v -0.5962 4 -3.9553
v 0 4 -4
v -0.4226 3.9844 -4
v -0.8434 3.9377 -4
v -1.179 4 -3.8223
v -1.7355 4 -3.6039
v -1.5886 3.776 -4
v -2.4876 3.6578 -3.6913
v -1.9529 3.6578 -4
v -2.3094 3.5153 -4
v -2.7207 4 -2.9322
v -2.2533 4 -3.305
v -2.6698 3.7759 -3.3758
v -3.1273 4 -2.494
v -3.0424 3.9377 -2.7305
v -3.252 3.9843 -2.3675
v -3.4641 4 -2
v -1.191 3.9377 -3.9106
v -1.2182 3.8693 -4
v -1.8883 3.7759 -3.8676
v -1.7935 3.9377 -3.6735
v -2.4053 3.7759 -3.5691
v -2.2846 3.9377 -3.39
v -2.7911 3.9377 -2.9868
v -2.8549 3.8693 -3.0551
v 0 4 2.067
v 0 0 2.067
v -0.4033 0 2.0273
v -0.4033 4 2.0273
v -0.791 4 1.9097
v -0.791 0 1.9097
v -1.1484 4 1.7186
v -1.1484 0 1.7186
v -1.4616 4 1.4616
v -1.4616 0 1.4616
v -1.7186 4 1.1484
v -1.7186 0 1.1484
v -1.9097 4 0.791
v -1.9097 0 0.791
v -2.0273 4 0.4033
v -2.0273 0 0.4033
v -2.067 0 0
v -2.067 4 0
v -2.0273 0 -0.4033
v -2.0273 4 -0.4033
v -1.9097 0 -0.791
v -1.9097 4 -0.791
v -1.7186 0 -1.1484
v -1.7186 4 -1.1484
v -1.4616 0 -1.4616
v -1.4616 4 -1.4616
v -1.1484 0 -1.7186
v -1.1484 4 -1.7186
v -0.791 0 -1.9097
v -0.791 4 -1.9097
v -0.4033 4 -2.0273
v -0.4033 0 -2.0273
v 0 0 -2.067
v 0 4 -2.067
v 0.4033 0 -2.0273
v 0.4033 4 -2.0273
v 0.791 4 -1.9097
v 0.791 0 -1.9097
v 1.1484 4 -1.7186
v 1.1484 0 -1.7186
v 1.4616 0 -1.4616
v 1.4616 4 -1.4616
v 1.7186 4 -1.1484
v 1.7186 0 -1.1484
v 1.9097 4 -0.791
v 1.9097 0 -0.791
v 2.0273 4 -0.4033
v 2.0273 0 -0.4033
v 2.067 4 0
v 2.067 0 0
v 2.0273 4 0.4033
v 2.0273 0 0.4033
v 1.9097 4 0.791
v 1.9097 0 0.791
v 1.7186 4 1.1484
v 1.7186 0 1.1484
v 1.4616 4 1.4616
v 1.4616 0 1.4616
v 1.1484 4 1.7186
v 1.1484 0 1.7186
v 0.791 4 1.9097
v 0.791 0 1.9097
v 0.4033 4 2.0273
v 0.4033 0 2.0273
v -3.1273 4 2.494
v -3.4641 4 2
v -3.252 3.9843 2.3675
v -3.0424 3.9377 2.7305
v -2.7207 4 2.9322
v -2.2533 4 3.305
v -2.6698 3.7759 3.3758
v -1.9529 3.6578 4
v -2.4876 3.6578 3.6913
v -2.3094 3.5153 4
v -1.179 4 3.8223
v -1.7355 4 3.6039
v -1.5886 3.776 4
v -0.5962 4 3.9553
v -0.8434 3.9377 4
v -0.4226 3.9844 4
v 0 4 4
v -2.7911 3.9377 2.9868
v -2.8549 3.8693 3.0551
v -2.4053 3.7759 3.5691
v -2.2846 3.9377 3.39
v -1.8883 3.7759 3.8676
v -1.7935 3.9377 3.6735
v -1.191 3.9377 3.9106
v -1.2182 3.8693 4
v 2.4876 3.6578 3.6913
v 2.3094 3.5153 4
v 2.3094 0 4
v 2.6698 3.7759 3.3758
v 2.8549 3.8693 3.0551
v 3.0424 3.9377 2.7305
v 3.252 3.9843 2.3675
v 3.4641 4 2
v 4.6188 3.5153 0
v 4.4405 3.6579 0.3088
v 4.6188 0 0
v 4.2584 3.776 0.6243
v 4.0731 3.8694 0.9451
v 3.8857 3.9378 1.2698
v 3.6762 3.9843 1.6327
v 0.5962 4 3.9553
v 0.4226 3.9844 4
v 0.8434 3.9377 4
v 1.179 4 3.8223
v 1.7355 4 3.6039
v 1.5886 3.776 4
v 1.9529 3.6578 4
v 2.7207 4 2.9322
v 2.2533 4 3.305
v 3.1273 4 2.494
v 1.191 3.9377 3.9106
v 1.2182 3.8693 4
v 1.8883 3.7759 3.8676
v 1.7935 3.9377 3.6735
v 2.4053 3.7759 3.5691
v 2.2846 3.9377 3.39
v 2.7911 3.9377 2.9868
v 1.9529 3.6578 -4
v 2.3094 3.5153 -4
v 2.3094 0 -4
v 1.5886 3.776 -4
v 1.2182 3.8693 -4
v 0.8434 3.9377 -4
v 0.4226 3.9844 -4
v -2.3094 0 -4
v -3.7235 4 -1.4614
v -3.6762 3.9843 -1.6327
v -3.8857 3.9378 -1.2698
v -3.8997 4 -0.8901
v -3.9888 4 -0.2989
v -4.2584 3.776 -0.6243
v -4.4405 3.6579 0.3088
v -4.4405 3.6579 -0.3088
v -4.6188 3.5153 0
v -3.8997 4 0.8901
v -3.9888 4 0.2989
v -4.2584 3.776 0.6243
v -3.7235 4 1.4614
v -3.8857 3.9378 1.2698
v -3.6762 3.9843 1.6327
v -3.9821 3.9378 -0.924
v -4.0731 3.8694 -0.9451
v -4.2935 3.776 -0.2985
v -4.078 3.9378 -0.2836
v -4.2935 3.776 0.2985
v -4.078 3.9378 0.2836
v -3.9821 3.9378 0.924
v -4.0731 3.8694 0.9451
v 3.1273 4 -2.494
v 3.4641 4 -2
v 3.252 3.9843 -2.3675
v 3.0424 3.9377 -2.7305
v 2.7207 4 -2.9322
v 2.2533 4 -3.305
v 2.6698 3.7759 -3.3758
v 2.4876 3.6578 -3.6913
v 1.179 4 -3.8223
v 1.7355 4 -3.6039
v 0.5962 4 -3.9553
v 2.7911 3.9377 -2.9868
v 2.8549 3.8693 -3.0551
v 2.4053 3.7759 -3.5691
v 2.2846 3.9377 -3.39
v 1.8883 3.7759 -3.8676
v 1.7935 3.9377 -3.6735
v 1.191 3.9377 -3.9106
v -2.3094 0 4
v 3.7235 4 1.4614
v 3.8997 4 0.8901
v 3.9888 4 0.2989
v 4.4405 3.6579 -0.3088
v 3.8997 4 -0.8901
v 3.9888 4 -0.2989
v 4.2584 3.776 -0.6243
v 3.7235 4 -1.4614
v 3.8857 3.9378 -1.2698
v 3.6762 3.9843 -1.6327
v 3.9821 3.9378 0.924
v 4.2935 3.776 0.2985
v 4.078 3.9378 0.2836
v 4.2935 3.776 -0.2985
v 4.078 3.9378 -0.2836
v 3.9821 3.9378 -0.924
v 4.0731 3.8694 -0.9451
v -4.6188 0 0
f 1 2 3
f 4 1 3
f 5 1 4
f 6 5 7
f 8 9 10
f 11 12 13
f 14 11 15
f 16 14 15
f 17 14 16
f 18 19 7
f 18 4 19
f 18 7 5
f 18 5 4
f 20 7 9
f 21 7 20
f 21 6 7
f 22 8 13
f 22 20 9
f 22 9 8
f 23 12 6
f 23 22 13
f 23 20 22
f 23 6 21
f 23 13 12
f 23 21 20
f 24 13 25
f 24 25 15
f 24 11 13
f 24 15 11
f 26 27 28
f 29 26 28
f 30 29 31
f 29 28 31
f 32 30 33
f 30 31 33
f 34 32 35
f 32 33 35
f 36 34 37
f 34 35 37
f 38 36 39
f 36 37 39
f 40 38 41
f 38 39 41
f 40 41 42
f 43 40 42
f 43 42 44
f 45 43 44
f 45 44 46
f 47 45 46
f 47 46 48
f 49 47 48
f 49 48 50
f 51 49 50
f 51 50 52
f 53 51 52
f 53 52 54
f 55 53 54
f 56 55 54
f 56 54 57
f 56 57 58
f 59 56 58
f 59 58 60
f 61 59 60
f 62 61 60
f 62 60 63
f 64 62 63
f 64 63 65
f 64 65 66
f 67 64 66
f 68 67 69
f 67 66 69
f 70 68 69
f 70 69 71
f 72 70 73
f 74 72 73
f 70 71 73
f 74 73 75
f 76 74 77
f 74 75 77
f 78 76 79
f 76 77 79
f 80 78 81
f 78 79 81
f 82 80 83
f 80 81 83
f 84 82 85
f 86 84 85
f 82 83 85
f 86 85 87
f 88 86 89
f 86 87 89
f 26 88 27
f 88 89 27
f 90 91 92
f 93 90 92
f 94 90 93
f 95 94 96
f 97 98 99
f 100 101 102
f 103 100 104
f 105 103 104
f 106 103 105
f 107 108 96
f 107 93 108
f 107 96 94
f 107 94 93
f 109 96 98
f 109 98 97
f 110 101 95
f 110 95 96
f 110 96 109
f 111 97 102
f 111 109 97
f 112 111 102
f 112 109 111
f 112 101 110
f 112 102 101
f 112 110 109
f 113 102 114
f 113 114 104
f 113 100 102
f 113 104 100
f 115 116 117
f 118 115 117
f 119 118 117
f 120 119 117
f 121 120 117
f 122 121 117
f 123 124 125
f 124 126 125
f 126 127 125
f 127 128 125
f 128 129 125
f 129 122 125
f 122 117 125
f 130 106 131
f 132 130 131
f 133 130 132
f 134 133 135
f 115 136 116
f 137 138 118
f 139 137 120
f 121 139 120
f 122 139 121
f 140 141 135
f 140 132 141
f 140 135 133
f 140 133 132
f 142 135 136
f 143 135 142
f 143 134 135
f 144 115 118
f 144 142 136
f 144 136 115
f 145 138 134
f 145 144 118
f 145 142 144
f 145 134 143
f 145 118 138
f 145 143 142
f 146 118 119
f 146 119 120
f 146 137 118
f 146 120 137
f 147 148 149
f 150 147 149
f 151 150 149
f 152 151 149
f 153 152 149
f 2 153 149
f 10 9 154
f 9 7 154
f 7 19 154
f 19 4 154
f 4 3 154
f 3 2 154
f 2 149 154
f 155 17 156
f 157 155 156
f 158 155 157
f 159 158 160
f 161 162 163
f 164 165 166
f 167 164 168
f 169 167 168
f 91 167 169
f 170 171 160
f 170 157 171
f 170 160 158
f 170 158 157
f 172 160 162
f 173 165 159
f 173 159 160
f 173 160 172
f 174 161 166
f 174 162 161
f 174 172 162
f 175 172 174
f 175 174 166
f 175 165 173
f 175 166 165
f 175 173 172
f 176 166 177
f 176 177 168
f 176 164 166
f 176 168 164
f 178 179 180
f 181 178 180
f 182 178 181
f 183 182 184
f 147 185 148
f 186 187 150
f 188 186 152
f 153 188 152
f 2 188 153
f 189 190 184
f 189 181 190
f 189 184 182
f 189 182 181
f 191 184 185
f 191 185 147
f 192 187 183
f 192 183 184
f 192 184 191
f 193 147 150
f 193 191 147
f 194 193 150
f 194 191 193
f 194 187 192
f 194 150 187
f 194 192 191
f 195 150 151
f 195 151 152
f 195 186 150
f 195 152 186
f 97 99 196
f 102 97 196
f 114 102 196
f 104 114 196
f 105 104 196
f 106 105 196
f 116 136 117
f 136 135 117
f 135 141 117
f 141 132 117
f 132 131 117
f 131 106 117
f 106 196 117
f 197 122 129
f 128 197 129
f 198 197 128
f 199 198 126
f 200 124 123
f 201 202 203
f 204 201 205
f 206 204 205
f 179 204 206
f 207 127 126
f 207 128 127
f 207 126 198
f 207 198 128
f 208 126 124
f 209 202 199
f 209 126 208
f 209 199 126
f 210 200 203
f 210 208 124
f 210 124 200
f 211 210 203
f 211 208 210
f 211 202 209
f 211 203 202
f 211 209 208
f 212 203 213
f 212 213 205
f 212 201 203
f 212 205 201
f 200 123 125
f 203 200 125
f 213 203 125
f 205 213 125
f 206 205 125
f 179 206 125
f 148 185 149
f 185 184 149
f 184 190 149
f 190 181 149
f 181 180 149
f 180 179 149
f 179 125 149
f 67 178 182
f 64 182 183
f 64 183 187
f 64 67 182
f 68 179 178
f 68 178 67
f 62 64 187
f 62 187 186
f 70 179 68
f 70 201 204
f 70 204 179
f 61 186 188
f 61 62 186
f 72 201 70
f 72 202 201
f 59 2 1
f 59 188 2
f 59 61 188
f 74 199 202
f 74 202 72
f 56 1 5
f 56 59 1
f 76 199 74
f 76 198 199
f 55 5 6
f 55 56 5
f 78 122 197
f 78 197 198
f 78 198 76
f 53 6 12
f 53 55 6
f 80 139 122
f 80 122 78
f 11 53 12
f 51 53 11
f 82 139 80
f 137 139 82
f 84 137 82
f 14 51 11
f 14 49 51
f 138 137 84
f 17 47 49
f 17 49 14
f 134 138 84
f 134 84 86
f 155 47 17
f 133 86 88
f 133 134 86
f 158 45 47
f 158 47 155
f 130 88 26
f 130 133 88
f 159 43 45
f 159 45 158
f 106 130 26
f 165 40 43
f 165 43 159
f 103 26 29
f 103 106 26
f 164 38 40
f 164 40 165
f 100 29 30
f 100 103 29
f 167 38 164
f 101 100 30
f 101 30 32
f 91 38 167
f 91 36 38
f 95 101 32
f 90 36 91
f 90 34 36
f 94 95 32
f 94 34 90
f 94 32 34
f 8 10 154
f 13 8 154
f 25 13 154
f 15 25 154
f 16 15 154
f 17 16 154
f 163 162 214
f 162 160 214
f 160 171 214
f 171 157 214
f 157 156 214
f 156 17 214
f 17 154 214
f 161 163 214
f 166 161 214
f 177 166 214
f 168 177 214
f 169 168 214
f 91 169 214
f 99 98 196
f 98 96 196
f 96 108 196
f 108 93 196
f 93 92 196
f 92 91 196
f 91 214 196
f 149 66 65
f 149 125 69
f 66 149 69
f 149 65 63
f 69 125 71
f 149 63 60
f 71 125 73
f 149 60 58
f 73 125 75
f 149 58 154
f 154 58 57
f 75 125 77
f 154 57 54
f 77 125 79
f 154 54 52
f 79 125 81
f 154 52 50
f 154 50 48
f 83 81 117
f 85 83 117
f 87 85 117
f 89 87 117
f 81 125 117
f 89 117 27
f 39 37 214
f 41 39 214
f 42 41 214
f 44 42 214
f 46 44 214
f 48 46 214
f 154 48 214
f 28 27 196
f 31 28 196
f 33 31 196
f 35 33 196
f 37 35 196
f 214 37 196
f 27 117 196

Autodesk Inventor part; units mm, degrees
ref_plane "YZ Plane" through (0, 0, 0) normal (1, 0, 0) x (0, 1, 0)
ref_plane "XZ Plane" through (0, 0, 0) normal (0, 1, 0) x (-1, 0, 0)
ref_plane "XY Plane" through (0, 0, 0) normal (0, 0, 1) x (1, 0, 0)
sketch "スケッチ1" plane through (0, 0, 0) normal (0, 1, 0) x (-1, 0, 0)
  circle A0 centre (0, 0) radius 4.6188 construction
  line L0 (4.6188, 0) -> (2.3094, 4)
  line L1 (2.3094, 4) -> (-2.3094, 4)
  line L2 (-2.3094, 4) -> (-4.6188, 0)
  line L3 (-4.6188, 0) -> (-2.3094, -4)
  line L4 (-2.3094, -4) -> (2.3094, -4)
  line L5 (2.3094, -4) -> (4.6188, 0)
  dimension "d0" = 8
extrude "押し出し1" add sketch "スケッチ1" along normal blind 4
sketch "スケッチ2" plane through (0, 4, 0) normal (0, 1, 0) x (1, 0, 0)
  point P0 (0, 0)
  point P1 (0, 0)
hole "穴1" at (0, 4, 0) direction (0, -1, 0) diameter 4.134 end through all thread size "M5x0.8" class "6H" standard "ISO Metric profile"
sketch "スケッチ3" plane through (0, 0, 0) normal (1, 0, 0) x (0, 1, 0)
  arc A0 (3.1544, -5) -> (4, -4) centre (-1.7446, 0) ccw
  line L0 (0, -4) -> (4, -4) construction
  line L1 (4, -5) -> (3.1544, -5)
  line L2 (4, 2.067) -> (4, -2.067) construction
  line L3 (4, -4) -> (4, -5)
  line L4 (-4.0084, 0) -> (4.4272, 0) projected
  point P0 (0, 0)
  point P1 (4, 0)
  dimension "d10" = 4
  dimension "d11" = 7
  dimension "d12" = 1
revolve "回転1" cut sketch "スケッチ3" angle 360 about axis through (0, -10, 0) along (0, 1, 0)
properties part number "M3-HexaNut-type2"
